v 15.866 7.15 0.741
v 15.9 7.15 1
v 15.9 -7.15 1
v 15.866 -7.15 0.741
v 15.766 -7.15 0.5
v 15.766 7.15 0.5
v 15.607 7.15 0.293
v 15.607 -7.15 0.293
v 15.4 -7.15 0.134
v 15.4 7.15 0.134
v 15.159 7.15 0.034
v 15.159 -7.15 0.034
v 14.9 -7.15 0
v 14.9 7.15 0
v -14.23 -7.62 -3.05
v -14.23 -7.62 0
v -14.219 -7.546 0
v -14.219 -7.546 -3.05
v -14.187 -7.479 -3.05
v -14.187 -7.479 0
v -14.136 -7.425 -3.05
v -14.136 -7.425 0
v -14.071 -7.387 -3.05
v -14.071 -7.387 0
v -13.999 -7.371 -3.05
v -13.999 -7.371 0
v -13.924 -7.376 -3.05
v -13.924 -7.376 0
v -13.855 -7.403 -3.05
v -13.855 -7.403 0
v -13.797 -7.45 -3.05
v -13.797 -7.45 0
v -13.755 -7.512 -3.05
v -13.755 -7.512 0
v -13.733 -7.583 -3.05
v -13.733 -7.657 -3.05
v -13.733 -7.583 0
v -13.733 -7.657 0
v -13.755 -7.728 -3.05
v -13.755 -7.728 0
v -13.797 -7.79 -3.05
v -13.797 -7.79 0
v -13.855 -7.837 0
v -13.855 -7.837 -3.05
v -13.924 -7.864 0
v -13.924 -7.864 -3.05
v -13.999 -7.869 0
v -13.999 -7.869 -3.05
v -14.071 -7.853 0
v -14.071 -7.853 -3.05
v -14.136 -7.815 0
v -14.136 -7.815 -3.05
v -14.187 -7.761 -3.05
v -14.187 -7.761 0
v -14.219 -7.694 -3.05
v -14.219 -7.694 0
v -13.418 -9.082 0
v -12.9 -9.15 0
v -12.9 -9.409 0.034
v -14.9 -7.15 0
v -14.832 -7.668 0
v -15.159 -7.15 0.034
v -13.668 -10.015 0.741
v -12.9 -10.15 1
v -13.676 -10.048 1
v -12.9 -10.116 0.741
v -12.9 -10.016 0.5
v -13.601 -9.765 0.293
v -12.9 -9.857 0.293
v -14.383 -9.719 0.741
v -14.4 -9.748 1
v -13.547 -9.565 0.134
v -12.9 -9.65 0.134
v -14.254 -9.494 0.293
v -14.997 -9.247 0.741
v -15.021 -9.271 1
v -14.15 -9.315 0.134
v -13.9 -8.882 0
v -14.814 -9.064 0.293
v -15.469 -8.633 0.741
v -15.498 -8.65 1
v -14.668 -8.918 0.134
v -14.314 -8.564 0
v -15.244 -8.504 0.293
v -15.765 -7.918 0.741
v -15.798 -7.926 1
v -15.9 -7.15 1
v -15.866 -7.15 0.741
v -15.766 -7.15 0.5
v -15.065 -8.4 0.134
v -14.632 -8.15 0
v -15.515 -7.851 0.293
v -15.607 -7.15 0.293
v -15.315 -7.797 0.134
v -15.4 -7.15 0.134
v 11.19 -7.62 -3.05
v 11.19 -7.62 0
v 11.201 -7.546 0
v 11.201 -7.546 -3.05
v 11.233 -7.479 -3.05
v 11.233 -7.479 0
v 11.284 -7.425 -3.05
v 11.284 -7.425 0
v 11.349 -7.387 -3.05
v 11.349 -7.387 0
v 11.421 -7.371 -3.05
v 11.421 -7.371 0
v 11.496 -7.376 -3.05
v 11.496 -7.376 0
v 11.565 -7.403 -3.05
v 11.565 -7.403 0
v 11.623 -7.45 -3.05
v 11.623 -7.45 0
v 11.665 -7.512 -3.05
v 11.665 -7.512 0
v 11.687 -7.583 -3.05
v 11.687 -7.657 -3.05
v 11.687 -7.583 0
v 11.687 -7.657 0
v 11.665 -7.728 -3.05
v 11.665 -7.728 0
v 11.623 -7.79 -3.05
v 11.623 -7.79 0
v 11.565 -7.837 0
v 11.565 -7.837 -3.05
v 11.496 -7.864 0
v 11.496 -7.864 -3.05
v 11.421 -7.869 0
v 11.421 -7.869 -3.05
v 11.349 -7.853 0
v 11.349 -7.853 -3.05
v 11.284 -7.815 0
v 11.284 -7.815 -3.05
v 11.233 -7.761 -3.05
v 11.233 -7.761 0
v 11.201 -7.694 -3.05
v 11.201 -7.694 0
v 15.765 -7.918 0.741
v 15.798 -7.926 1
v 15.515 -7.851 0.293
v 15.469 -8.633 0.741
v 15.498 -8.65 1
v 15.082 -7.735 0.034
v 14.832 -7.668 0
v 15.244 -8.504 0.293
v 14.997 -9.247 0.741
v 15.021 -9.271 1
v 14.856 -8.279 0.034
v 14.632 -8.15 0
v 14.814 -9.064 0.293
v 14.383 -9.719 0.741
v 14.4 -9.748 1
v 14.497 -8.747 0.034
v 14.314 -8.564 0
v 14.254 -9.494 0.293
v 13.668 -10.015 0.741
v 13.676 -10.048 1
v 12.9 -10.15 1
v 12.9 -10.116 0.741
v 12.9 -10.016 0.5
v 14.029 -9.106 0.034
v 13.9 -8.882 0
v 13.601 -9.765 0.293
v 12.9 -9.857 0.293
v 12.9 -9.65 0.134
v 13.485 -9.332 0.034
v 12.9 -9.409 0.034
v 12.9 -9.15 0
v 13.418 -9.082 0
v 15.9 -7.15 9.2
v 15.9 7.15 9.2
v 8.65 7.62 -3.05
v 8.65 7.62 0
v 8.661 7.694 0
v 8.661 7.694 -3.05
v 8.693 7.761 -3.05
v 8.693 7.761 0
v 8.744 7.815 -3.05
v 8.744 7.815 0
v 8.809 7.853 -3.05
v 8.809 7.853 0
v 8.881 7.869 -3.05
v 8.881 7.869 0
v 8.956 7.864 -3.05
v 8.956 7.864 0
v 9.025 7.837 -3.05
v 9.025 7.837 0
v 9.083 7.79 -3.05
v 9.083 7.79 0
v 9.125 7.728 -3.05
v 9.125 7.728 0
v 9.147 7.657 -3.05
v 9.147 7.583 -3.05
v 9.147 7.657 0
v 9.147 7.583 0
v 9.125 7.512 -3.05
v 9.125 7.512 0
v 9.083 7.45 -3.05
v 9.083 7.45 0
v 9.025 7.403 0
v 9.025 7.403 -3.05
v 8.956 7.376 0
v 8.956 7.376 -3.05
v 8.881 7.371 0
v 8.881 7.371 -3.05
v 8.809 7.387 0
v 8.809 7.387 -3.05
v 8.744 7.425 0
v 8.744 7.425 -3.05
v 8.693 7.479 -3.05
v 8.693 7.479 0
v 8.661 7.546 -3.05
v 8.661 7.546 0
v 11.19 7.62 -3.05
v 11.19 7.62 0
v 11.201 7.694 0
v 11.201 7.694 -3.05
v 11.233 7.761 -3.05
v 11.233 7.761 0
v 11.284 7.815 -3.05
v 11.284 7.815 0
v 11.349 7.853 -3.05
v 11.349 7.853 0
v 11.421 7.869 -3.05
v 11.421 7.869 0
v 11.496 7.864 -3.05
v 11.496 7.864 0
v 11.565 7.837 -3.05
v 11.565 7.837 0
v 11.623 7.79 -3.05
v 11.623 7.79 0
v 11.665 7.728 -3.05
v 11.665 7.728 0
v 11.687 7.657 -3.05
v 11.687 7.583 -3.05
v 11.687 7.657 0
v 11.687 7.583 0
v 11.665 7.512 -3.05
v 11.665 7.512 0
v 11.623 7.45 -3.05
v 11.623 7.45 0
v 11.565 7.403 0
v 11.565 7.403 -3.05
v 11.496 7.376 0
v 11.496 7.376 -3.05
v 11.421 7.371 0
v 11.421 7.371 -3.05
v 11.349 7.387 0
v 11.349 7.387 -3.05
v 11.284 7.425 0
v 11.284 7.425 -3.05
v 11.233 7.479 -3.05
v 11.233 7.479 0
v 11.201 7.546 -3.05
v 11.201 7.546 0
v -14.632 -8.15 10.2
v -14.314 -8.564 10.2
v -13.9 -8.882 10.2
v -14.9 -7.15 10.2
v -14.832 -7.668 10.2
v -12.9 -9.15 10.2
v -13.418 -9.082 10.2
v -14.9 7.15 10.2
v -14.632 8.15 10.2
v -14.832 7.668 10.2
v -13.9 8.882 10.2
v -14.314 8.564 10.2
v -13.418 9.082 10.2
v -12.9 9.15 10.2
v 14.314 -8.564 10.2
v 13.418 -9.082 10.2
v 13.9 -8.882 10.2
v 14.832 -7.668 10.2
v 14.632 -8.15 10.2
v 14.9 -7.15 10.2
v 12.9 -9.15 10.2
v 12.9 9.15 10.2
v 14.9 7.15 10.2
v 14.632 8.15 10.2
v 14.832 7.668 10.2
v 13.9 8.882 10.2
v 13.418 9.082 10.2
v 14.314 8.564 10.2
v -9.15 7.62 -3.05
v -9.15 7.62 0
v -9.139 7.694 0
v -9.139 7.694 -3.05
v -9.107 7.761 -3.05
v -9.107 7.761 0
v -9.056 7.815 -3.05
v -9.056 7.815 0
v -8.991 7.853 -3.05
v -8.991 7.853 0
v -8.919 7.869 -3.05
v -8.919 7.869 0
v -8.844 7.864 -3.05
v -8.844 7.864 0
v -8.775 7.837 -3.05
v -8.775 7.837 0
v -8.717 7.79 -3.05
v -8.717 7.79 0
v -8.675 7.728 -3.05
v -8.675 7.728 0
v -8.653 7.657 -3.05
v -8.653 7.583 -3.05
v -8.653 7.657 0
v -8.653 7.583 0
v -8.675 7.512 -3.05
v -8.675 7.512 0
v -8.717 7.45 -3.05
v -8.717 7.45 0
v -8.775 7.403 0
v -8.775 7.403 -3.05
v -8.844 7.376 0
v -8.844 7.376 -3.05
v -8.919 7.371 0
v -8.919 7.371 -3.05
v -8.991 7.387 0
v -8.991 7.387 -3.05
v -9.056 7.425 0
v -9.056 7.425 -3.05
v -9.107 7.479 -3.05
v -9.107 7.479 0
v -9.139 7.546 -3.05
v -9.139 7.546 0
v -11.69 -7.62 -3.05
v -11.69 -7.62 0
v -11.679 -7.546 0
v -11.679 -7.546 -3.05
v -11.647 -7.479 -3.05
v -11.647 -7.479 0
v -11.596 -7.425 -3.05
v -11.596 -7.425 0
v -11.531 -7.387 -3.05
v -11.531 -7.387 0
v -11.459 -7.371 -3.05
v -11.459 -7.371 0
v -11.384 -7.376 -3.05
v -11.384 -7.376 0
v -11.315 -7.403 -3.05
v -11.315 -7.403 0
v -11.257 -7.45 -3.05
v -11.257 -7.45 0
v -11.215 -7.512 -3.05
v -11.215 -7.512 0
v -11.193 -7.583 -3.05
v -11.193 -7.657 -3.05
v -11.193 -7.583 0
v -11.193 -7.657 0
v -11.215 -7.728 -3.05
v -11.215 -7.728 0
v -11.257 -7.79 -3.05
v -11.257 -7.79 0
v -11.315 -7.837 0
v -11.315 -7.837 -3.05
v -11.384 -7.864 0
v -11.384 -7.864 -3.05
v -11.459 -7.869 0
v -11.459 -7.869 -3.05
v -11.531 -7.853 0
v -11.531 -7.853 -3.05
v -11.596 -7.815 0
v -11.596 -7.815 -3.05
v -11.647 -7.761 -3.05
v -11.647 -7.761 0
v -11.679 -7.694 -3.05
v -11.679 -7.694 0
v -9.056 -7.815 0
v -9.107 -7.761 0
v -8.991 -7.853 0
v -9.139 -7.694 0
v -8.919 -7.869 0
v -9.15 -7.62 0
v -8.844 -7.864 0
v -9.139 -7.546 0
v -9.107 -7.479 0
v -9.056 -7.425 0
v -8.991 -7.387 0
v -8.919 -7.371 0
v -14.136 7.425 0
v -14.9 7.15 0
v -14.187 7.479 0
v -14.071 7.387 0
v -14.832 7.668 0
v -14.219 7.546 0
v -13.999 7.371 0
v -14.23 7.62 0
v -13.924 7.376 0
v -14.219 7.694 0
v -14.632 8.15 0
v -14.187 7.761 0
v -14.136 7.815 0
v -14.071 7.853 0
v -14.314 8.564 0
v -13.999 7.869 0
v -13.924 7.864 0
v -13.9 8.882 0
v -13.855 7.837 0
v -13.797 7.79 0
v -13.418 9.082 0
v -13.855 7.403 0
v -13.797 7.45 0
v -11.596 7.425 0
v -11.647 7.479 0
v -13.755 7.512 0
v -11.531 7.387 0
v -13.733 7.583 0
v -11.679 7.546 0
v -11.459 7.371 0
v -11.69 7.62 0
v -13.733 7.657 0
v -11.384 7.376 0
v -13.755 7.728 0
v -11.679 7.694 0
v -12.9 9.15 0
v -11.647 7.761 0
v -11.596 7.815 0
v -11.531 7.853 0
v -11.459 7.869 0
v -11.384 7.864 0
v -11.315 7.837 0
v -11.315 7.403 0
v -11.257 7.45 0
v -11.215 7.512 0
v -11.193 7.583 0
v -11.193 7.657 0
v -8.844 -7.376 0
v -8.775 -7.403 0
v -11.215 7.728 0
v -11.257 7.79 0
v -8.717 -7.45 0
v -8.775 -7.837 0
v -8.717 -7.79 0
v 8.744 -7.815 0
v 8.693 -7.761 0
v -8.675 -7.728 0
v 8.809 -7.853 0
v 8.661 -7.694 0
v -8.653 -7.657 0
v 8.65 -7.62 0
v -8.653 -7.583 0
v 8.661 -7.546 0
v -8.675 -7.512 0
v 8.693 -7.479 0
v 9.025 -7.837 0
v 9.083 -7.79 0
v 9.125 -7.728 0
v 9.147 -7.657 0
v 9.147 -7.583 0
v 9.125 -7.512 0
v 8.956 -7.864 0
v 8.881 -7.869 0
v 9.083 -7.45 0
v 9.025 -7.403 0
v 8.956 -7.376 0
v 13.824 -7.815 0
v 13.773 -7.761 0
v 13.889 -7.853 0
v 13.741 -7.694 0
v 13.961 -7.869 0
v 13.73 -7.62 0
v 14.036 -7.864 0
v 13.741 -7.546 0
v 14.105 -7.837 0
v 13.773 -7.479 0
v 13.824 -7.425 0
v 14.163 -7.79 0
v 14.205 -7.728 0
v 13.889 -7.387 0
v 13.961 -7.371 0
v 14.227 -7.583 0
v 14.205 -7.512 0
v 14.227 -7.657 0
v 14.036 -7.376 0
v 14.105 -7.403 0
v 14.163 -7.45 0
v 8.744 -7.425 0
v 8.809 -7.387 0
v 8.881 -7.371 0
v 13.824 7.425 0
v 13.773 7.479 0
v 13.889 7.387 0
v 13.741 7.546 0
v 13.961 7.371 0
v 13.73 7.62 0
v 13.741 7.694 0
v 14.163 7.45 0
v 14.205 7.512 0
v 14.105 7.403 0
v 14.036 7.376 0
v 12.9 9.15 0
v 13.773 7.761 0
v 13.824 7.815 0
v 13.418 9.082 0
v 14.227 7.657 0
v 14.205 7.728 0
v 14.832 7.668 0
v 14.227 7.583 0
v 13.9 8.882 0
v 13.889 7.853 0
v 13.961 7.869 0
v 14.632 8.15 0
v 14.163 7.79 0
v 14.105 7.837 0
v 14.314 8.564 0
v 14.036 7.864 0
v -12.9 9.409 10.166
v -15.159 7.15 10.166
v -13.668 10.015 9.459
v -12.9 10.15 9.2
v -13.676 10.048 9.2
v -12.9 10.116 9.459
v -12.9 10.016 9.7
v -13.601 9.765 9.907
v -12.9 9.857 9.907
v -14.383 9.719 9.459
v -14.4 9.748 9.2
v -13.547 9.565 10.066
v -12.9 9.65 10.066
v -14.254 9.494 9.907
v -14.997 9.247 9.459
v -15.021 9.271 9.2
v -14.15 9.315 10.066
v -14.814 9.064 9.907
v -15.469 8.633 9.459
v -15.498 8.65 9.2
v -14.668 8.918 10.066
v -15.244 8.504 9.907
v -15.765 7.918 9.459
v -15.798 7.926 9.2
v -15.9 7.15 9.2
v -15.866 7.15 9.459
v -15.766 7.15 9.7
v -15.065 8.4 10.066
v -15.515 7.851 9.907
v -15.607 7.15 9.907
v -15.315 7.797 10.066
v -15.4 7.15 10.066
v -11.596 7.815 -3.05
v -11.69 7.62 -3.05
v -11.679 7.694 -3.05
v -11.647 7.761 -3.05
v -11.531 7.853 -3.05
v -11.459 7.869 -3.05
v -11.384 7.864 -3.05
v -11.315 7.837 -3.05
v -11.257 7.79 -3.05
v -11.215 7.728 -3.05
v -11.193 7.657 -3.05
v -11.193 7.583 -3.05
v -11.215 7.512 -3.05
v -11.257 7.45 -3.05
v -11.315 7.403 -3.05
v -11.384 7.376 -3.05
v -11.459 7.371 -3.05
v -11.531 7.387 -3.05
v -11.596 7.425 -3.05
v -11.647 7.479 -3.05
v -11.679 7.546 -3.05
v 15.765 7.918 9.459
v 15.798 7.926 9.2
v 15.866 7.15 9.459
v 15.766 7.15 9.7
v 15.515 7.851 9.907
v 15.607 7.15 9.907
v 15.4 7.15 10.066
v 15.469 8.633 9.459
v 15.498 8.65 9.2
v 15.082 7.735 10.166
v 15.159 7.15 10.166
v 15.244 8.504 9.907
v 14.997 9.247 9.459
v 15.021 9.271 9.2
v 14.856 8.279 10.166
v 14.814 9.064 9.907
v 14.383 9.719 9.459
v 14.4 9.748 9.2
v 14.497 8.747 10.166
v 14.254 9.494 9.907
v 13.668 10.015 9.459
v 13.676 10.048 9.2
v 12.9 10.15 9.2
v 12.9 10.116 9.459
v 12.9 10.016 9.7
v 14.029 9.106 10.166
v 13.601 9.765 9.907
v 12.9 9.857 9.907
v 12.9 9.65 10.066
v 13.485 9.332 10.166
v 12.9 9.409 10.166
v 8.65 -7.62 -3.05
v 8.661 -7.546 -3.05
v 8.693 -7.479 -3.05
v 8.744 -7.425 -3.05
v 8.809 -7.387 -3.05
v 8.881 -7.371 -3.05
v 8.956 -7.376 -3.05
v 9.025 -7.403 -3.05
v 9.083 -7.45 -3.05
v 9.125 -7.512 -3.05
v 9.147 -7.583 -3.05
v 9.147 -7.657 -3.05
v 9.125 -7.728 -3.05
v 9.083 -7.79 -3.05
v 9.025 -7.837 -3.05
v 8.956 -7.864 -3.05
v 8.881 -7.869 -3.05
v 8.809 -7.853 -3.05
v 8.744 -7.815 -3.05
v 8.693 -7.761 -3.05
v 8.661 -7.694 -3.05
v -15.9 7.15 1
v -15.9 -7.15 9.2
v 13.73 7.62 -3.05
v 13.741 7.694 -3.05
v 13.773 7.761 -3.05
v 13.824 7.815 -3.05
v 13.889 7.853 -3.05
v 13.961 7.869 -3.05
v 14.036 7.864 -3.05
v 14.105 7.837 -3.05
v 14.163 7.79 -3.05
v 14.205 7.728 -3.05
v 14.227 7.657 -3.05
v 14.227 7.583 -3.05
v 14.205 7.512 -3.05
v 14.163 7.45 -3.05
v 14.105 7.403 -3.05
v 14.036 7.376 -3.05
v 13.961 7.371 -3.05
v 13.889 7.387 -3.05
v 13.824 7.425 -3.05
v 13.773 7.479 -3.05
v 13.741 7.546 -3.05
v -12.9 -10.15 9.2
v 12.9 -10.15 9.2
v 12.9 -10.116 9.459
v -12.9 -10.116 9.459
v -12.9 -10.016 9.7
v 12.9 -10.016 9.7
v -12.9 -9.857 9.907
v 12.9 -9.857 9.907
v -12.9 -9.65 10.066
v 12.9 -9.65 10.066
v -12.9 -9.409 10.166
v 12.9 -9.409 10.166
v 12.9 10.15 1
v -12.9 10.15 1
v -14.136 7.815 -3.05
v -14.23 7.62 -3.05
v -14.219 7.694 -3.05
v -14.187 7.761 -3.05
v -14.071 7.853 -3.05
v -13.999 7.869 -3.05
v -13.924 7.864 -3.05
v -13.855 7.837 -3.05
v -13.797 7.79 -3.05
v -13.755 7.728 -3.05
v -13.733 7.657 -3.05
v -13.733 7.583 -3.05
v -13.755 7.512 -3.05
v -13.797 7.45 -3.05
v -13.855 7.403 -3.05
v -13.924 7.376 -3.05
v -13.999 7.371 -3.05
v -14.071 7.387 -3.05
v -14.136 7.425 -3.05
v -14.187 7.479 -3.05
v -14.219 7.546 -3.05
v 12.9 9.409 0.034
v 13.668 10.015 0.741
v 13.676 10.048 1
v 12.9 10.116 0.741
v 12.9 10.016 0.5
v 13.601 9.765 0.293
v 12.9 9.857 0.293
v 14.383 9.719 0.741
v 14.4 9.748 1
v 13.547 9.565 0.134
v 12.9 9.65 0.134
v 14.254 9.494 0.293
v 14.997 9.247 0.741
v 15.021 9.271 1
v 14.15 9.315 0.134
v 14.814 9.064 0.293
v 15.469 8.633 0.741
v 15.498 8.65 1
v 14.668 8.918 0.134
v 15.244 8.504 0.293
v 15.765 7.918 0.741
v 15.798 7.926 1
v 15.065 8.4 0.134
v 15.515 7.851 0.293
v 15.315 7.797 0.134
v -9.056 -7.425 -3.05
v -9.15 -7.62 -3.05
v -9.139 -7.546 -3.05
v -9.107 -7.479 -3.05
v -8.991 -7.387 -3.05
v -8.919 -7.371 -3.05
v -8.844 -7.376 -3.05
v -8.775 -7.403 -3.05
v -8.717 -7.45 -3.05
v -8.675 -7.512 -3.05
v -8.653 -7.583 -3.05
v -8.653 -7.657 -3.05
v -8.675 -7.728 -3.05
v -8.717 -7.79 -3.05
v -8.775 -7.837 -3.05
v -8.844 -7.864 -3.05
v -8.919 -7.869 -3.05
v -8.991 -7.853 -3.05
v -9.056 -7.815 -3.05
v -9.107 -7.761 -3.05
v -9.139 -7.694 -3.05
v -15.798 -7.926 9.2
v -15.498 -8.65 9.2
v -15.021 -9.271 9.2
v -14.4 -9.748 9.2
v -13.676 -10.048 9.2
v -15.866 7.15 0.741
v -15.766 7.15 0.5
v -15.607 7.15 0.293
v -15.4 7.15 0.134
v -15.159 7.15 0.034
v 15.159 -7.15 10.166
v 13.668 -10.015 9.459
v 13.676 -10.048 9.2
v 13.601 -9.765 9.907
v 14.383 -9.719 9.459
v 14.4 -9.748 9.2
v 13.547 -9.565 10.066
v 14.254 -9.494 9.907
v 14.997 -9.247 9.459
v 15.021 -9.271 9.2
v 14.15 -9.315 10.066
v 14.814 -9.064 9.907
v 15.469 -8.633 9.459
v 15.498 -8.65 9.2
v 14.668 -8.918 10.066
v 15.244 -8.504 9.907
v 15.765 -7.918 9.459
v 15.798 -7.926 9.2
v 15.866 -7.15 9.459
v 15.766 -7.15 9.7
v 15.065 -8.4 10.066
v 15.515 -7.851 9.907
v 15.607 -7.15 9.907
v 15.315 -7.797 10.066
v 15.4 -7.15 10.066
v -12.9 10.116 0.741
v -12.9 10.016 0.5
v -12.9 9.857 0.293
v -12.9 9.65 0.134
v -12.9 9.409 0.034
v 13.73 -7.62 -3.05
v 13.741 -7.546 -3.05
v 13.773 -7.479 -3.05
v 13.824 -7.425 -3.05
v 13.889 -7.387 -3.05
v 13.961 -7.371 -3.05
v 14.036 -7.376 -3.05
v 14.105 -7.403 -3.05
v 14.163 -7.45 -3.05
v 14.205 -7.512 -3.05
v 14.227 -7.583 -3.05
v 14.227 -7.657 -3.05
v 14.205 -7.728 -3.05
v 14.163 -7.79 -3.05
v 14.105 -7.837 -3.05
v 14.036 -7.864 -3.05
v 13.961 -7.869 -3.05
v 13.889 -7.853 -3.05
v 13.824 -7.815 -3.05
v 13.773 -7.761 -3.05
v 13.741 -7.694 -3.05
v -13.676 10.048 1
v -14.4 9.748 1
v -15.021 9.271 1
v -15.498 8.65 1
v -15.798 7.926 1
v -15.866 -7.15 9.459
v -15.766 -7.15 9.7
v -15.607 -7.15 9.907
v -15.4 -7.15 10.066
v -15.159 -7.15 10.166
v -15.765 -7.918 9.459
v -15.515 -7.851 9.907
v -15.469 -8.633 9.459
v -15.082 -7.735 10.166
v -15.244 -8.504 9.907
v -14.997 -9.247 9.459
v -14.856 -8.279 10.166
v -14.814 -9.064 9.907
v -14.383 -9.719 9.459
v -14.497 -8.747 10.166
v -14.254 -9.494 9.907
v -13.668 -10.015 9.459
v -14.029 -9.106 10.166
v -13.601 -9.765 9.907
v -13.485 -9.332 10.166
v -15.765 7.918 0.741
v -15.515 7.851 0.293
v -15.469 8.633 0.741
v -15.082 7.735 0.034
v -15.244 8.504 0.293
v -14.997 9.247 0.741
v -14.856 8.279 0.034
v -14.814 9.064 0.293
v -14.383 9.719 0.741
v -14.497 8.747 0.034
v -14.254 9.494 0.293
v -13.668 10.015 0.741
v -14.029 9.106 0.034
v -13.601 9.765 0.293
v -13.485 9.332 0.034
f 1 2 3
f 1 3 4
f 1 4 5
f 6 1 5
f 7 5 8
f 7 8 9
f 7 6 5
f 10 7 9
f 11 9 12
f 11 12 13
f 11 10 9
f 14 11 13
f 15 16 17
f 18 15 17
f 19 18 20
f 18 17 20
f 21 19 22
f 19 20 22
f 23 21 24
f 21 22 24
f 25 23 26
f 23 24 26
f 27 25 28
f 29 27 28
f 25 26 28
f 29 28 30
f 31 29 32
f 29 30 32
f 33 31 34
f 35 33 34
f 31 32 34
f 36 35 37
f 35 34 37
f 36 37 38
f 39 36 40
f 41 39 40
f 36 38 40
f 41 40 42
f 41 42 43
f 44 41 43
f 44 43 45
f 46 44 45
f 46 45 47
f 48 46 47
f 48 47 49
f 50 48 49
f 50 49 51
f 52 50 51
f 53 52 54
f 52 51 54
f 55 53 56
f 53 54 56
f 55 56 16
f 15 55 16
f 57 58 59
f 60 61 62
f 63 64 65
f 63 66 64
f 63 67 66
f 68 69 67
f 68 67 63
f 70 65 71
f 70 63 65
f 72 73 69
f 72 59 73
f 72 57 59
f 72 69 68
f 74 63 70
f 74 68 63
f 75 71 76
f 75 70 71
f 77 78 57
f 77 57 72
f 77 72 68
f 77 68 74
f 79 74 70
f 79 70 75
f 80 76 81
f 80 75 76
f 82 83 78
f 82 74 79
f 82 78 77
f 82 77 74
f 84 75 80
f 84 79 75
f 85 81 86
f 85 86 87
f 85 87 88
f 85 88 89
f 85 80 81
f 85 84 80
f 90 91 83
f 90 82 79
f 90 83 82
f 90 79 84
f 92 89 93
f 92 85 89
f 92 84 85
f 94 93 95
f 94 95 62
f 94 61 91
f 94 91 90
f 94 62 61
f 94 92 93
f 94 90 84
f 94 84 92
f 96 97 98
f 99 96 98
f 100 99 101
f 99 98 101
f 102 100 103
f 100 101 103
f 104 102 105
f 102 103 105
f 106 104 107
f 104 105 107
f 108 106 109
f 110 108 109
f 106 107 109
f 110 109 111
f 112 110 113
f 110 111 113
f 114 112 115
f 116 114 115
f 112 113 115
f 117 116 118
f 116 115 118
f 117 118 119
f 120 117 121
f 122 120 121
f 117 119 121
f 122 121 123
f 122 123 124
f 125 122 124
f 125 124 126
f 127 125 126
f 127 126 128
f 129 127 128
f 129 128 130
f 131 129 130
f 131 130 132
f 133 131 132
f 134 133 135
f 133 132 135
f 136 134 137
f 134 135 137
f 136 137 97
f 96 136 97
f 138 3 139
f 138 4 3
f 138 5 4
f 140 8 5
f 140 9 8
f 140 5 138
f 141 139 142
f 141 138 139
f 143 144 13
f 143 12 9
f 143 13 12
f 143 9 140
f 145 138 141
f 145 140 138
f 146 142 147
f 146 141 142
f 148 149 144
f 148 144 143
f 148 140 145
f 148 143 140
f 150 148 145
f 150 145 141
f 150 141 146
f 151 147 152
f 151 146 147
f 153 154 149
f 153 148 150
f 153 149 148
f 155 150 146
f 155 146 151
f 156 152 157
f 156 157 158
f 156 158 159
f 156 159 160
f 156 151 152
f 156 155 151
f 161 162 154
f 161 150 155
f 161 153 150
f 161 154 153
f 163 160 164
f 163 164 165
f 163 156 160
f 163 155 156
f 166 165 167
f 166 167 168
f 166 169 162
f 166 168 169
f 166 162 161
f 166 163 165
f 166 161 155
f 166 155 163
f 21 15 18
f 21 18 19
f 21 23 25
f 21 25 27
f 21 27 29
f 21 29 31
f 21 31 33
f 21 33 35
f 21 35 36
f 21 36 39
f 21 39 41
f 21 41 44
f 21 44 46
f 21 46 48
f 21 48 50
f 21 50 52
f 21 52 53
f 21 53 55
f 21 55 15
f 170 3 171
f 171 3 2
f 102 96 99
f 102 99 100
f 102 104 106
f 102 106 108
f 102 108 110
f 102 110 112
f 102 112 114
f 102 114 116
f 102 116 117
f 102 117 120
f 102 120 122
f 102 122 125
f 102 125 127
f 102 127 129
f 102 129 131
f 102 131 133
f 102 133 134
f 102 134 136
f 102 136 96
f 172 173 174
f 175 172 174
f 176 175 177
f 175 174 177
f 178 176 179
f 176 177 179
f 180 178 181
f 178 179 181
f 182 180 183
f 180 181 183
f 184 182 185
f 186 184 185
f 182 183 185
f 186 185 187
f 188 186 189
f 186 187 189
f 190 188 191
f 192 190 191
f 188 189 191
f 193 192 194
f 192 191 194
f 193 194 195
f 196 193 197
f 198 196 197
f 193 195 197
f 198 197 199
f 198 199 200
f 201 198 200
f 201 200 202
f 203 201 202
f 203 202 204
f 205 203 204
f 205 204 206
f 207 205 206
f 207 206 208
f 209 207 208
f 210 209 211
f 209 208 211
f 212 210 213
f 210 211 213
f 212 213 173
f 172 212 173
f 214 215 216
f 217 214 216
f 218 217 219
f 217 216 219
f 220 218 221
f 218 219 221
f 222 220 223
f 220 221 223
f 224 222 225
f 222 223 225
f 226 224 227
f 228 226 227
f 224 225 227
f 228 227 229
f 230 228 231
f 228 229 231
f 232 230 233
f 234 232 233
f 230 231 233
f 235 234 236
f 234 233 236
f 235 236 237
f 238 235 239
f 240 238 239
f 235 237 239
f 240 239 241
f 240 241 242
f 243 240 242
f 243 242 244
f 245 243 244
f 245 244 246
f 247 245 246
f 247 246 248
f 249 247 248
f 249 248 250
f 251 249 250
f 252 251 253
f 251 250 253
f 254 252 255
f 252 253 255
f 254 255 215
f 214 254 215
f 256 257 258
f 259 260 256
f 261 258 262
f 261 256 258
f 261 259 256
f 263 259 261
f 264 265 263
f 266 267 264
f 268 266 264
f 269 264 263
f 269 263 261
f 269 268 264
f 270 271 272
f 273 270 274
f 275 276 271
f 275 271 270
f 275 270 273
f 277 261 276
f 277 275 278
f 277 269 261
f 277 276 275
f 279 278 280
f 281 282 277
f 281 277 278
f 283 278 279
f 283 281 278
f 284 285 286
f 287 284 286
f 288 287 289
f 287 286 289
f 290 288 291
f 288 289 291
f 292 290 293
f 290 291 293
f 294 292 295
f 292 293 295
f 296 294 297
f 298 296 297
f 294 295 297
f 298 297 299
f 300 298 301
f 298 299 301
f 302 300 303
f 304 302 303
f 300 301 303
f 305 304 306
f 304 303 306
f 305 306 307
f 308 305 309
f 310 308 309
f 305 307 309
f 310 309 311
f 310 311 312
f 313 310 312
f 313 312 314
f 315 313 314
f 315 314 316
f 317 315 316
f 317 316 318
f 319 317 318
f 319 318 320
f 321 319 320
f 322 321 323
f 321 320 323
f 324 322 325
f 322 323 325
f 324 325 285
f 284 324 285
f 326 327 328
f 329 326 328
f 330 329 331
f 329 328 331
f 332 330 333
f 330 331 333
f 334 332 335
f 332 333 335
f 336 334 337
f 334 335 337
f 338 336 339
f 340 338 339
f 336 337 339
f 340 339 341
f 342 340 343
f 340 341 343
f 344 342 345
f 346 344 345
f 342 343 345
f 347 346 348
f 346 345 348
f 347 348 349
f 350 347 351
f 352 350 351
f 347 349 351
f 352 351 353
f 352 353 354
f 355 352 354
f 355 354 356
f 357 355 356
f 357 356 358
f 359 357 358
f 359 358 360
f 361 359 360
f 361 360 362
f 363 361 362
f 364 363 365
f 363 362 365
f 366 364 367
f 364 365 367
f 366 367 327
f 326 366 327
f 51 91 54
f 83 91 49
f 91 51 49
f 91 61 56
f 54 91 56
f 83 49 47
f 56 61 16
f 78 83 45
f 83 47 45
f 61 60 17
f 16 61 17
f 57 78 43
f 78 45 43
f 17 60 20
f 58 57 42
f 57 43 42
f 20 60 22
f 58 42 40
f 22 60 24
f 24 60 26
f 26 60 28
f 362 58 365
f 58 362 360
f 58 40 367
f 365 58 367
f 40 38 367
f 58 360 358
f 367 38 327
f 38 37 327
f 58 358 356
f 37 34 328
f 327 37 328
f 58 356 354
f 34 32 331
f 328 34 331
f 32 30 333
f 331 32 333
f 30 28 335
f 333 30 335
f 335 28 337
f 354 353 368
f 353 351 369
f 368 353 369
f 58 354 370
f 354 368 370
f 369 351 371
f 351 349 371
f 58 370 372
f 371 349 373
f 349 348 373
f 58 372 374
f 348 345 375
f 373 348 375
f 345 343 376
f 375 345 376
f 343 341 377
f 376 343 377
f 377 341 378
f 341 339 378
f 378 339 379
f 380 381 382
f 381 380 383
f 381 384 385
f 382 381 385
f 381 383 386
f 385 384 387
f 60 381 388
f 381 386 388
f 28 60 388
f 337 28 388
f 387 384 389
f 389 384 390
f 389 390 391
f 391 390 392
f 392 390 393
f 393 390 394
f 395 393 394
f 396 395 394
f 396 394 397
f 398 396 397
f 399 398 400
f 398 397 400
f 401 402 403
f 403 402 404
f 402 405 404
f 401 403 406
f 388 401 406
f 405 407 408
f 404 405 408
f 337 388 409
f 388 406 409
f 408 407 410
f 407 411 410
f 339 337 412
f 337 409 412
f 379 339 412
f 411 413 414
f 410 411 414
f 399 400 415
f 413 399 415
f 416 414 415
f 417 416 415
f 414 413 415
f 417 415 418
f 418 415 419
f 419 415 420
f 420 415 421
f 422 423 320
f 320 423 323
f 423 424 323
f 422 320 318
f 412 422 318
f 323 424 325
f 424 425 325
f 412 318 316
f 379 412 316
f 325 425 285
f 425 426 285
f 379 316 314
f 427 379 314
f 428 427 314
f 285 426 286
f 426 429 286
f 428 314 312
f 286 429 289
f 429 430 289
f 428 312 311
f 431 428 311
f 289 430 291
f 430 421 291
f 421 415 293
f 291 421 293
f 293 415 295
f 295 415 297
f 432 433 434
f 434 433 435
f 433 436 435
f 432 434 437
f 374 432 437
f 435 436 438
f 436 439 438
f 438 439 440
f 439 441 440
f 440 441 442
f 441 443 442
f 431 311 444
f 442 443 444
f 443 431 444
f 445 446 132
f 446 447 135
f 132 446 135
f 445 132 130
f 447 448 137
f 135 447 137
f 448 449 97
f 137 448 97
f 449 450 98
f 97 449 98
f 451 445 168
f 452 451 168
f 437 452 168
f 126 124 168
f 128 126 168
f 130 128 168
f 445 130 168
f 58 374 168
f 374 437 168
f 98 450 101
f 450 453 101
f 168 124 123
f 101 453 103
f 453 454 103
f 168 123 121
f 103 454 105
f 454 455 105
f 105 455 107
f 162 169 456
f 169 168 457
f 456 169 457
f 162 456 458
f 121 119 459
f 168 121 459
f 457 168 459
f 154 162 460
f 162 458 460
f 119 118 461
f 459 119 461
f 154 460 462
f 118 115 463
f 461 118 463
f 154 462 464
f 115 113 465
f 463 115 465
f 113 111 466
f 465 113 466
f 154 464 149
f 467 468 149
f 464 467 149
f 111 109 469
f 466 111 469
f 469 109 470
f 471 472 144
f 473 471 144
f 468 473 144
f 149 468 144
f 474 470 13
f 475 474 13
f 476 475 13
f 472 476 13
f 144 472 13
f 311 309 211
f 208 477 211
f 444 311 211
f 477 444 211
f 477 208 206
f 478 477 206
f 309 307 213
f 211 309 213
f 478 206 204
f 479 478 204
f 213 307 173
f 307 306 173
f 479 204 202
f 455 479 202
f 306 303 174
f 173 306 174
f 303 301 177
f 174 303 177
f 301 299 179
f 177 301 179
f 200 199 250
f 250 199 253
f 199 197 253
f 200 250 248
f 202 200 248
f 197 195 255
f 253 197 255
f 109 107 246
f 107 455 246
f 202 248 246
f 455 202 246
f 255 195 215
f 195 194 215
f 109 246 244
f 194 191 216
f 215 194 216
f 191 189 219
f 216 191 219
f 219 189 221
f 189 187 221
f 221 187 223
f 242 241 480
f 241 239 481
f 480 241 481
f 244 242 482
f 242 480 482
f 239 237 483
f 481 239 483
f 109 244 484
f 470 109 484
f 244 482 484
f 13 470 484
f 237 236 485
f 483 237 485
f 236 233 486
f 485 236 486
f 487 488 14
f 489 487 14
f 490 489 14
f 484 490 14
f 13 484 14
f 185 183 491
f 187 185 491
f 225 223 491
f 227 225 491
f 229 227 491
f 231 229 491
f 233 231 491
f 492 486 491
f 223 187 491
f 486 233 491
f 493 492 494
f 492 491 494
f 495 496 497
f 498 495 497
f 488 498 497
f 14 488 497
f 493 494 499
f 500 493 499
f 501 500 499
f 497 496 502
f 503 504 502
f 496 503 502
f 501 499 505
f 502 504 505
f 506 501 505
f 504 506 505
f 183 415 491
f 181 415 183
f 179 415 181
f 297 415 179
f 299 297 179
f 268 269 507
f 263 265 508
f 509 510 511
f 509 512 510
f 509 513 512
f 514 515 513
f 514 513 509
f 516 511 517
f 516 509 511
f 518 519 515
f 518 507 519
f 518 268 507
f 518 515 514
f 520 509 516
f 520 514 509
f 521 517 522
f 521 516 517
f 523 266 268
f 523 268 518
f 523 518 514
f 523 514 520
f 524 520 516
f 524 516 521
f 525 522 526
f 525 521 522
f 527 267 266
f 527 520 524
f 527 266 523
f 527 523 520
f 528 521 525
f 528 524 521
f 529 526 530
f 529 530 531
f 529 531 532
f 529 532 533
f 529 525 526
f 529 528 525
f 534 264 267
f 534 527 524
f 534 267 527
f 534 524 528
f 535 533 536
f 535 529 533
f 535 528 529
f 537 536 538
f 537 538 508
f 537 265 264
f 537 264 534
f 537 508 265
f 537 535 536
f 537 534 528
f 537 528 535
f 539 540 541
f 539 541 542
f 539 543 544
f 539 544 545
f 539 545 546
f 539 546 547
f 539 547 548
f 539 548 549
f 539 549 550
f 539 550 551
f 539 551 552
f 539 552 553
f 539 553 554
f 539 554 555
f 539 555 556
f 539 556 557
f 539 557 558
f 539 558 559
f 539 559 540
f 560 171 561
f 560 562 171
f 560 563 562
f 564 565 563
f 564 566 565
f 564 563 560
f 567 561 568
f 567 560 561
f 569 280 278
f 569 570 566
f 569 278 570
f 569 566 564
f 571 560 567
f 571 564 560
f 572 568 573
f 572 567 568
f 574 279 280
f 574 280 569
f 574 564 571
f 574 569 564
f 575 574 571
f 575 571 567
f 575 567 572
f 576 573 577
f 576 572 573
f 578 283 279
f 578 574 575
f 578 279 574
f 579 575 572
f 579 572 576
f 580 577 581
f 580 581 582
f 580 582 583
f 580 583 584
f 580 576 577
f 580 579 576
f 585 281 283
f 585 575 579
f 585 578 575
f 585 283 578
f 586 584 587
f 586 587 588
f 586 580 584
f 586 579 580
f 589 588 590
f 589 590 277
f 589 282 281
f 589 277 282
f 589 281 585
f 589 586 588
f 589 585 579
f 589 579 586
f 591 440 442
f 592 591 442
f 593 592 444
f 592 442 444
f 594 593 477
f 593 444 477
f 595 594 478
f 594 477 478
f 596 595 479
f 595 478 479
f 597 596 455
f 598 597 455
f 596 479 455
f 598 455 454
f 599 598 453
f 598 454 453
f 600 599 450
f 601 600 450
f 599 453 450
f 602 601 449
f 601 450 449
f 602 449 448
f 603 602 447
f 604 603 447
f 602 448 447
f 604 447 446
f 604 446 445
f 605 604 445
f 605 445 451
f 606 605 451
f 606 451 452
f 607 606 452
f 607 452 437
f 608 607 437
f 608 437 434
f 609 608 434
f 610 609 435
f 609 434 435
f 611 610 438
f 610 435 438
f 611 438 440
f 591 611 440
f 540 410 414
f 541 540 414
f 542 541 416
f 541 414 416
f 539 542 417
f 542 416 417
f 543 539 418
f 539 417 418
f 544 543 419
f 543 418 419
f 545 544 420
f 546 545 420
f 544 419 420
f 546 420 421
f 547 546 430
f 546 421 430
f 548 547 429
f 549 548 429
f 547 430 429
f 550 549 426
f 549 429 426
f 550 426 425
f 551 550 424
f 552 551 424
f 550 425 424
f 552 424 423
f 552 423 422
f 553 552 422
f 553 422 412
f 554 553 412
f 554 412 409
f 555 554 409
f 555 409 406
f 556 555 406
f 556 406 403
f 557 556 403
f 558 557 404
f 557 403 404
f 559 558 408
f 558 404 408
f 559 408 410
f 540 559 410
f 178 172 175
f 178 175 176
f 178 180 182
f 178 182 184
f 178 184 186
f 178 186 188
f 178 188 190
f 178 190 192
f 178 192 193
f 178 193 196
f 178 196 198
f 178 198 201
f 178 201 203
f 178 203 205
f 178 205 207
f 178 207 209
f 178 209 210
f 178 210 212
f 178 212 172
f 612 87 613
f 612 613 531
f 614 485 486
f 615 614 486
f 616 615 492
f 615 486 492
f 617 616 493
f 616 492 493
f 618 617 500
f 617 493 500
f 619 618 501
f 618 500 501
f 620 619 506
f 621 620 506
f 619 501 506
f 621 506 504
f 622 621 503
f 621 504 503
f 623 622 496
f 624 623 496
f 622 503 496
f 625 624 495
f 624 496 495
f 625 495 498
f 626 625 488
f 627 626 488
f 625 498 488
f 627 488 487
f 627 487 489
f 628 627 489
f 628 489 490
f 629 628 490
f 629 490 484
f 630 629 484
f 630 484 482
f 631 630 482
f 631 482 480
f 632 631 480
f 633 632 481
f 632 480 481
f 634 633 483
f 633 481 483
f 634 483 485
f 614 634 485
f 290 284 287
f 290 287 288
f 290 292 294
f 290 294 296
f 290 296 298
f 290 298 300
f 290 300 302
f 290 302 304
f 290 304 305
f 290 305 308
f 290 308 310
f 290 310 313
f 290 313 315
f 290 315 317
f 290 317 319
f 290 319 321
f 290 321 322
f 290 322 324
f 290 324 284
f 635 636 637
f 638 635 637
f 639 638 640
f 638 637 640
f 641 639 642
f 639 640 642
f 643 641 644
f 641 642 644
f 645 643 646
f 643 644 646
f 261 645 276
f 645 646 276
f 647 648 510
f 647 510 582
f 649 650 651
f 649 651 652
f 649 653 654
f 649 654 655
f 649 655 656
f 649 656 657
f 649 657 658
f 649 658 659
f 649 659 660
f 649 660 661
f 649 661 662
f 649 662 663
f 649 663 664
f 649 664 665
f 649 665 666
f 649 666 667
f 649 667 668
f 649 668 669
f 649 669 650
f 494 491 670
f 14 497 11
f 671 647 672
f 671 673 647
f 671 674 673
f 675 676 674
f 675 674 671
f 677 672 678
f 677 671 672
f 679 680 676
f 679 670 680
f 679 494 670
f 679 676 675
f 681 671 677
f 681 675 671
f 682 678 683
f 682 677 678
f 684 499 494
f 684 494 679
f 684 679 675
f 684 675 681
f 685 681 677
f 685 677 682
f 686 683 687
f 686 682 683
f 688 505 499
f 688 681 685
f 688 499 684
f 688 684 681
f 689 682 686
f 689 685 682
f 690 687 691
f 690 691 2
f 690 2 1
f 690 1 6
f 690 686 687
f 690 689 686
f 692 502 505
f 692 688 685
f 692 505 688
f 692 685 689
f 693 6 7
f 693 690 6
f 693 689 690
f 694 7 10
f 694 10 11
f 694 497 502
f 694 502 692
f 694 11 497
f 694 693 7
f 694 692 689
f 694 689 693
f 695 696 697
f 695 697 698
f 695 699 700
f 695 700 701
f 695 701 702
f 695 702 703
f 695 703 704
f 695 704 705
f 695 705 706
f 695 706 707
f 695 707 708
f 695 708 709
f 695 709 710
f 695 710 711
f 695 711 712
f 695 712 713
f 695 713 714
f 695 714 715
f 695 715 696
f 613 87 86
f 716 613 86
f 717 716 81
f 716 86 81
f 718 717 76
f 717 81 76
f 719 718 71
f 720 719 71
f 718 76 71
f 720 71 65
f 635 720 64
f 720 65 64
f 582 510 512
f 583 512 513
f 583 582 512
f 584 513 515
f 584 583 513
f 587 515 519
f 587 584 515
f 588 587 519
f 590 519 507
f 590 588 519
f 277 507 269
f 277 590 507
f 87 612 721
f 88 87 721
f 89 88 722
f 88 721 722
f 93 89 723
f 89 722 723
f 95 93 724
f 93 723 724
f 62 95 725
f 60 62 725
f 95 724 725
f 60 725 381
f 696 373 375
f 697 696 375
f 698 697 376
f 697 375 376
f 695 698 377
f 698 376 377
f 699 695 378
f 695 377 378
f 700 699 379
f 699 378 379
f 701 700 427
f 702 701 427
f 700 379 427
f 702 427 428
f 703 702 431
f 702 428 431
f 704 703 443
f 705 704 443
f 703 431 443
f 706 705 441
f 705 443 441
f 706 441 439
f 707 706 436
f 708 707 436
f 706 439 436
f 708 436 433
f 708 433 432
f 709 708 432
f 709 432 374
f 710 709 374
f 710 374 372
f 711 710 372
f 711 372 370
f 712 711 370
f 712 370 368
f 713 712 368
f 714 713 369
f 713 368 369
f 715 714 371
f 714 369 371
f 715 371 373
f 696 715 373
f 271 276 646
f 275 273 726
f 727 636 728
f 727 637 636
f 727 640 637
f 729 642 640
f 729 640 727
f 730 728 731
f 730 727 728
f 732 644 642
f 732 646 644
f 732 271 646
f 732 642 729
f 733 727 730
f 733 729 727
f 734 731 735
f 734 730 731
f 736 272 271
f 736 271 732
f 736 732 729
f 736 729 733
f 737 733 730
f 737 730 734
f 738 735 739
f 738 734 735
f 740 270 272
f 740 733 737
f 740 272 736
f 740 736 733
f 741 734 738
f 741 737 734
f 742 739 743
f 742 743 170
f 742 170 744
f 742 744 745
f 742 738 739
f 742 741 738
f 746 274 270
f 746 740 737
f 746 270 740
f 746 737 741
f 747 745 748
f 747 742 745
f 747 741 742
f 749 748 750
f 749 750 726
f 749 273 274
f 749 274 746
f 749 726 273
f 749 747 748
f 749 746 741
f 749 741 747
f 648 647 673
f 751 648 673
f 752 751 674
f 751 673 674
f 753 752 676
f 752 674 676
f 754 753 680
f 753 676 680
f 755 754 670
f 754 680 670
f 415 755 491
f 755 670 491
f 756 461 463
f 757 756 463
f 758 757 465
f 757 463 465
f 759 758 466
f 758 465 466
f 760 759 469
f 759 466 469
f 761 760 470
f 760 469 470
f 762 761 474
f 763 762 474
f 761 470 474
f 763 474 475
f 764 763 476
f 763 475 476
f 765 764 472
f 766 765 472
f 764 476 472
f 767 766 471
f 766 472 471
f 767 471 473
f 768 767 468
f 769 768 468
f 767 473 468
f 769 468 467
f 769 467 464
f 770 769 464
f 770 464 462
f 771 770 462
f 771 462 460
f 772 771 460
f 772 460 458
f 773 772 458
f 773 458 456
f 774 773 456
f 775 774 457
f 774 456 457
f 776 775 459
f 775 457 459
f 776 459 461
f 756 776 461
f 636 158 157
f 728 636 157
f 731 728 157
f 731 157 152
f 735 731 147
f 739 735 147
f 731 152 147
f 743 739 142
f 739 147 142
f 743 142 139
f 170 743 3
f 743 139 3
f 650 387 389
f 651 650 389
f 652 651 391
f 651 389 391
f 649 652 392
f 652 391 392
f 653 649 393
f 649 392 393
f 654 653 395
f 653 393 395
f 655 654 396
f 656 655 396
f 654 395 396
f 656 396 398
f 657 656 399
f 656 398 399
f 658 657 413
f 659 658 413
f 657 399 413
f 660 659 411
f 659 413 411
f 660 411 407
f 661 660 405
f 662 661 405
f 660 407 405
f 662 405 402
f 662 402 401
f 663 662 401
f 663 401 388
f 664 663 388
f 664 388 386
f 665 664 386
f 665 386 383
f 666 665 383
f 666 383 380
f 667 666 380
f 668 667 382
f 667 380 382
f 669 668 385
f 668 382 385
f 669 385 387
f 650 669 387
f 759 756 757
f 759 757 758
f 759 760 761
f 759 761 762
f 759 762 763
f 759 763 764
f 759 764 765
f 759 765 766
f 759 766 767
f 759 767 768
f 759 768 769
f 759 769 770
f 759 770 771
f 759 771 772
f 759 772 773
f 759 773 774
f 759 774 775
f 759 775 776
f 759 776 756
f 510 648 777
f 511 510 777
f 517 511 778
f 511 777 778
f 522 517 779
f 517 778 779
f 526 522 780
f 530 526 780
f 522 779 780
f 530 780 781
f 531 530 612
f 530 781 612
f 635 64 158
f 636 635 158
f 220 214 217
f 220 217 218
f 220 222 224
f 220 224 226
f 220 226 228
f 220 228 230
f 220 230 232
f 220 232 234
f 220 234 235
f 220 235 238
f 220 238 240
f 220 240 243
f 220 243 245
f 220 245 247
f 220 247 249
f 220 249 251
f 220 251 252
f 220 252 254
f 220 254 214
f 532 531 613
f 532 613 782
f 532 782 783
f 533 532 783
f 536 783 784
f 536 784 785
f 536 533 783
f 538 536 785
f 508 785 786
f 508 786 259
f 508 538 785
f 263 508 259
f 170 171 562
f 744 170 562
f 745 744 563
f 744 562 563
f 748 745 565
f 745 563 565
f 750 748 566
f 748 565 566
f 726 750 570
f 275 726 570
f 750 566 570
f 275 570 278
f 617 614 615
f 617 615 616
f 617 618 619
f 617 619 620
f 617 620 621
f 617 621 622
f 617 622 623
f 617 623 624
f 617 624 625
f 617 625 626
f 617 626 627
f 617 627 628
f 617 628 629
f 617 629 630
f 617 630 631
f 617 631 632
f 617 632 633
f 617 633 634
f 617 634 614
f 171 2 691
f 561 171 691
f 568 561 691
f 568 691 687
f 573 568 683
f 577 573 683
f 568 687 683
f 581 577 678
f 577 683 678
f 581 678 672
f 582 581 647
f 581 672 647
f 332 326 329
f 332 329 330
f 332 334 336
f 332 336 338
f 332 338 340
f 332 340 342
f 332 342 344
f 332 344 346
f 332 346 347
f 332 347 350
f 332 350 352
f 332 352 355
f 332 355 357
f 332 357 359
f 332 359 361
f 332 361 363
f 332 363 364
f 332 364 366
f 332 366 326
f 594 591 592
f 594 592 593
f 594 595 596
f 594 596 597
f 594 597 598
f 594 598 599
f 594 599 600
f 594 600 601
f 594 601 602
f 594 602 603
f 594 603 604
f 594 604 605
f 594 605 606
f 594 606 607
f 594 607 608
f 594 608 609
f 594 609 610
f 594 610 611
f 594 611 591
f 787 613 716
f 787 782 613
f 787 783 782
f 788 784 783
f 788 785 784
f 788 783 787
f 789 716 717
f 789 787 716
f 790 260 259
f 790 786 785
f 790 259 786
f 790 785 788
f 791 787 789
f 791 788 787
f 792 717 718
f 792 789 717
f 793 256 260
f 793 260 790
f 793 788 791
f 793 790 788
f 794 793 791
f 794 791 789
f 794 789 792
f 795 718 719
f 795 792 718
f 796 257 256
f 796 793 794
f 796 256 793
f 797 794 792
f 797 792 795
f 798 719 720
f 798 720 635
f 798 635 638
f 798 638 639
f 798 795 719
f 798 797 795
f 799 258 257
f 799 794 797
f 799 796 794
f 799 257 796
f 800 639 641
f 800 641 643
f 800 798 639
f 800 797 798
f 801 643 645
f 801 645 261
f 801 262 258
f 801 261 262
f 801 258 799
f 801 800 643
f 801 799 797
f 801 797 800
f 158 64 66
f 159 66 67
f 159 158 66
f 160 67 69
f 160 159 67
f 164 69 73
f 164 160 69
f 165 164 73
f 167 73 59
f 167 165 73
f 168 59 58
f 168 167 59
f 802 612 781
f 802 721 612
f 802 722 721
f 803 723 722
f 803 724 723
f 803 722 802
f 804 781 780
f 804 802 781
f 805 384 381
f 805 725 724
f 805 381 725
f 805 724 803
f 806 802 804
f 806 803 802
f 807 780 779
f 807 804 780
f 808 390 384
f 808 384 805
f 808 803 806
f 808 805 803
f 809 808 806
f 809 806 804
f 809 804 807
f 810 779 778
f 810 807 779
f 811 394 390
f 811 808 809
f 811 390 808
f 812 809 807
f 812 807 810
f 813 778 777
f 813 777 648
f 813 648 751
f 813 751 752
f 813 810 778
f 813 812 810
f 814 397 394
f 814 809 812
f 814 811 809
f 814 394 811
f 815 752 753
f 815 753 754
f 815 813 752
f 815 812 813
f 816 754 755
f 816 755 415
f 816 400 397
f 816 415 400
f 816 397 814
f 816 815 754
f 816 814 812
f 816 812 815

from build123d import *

# Parameters (mm, degrees)
SKETCH_1_W      = 31.8
SKETCH_1_H      = 20.3
EXTRUDE_1_DEPTH = 10.2
FILLET_2_R      = 1
FILLET_1_R      = 3
SKETCH_2_R      = 0.25
EXTRUDE_2_DEPTH = 3.05


with BuildPart() as part:
    # Эскиз1 → Бобышка-Вытянуть1 (new body)
    with BuildSketch(Plane.XY):
        Rectangle(SKETCH_1_W, SKETCH_1_H)
    extrude(amount=EXTRUDE_1_DEPTH)

    # Скругление2
    fillet_2_edges = [part.edges().sort_by_distance(p)[0] for p in [
        (-15.9, 0, 10.2),
        (0, -10.15, 10.2),
        (15.9, 0, 10.2),
        (0, -10.15, 0),
        (-15.9, 0, 0),
        (0, 10.15, 0),
        (15.9, 0, 0),
        (0, 10.15, 10.2),
    ]]
    fillet(fillet_2_edges, radius=FILLET_2_R)

    # Скругление1
    # the kernel refuses this fillet: 3 mm, written as the material it takes off along each edge
    with BuildSketch(Plane(origin=(12.9, -7.15, 0), x_dir=(1, 0, 0), z_dir=(0, 1, 0))) as fillet_1_piece_1:
        with BuildLine():
            CenterArc((2, -1), 1, 0, 90)
            Line((3, -1), (3, 0))
            Line((3, 0), (2, 0))
        make_face()
    revolve(axis=Axis((12.9, -7.15, 0), (0, 0, -1)), revolution_arc=90, mode=Mode.SUBTRACT)
    with BuildSketch(Plane(origin=(-12.9, -7.15, 0), x_dir=(0, -1, 0), z_dir=(1, 0, 0))) as fillet_1_piece_2:
        with BuildLine():
            CenterArc((2, -1), 1, 0, 90)
            Line((3, -1), (3, 0))
            Line((3, 0), (2, 0))
        make_face()
    revolve(axis=Axis((-12.9, -7.15, 0), (0, 0, -1)), revolution_arc=90, mode=Mode.SUBTRACT)
    with BuildSketch(Plane(origin=(12.9, 7.15, 0), x_dir=(0, 1, 0), z_dir=(-1, 0, 0))) as fillet_1_piece_3:
        with BuildLine():
            CenterArc((2, -1), 1, 0, 90)
            Line((3, -1), (3, 0))
            Line((3, 0), (2, 0))
        make_face()
    revolve(axis=Axis((12.9, 7.15, 0), (0, 0, -1)), revolution_arc=90, mode=Mode.SUBTRACT)
    with BuildSketch(Plane(origin=(-12.9, 7.15, 0), x_dir=(-1, 0, 0), z_dir=(0, -1, 0))) as fillet_1_piece_4:
        with BuildLine():
            CenterArc((2, -1), 1, 0, 90)
            Line((3, -1), (3, 0))
            Line((3, 0), (2, 0))
        make_face()
    revolve(axis=Axis((-12.9, 7.15, 0), (0, 0, -1)), revolution_arc=90, mode=Mode.SUBTRACT)
    with BuildSketch(Plane(origin=(12.9, -7.15, 10.2), x_dir=(0, -1, 0), z_dir=(-1, 0, 0))) as fillet_1_piece_5:
        with BuildLine():
            CenterArc((2, -1), 1, 0, 90)
            Line((3, -1), (3, 0))
            Line((3, 0), (2, 0))
        make_face()
    revolve(axis=Axis((12.9, -7.15, 10.2), (0, 0, 1)), revolution_arc=90, mode=Mode.SUBTRACT)
    with BuildSketch(Plane(origin=(-12.9, -7.15, 10.2), x_dir=(-1, 0, 0), z_dir=(0, 1, 0))) as fillet_1_piece_6:
        with BuildLine():
            CenterArc((2, -1), 1, 0, 90)
            Line((3, -1), (3, 0))
            Line((3, 0), (2, 0))
        make_face()
    revolve(axis=Axis((-12.9, -7.15, 10.2), (0, 0, 1)), revolution_arc=90, mode=Mode.SUBTRACT)
    with BuildSketch(Plane(origin=(12.9, 7.15, 10.2), x_dir=(1, 0, 0), z_dir=(0, -1, 0))) as fillet_1_piece_7:
        with BuildLine():
            CenterArc((2, -1), 1, 0, 90)
            Line((3, -1), (3, 0))
            Line((3, 0), (2, 0))
        make_face()
    revolve(axis=Axis((12.9, 7.15, 10.2), (0, 0, 1)), revolution_arc=90, mode=Mode.SUBTRACT)
    with BuildSketch(Plane(origin=(-12.9, 7.15, 10.2), x_dir=(0, 1, 0), z_dir=(1, 0, 0))) as fillet_1_piece_8:
        with BuildLine():
            CenterArc((2, -1), 1, 0, 90)
            Line((3, -1), (3, 0))
            Line((3, 0), (2, 0))
        make_face()
    revolve(axis=Axis((-12.9, 7.15, 10.2), (0, 0, 1)), revolution_arc=90, mode=Mode.SUBTRACT)
    with BuildSketch(Plane(origin=(-15.9, 10.15, 0), x_dir=(0, -1, 0), z_dir=(0, 0, 1)), Plane(origin=(-15.9, -10.15, 0), x_dir=(1, 0, 0), z_dir=(0, 0, 1))) as fillet_1_piece_9:
        with BuildLine():
            CenterArc((FILLET_1_R, FILLET_1_R), FILLET_1_R, 180, 90)
            Line((0, FILLET_1_R), (0, 0))
            Line((0, 0), (FILLET_1_R, 0))
        make_face()
    extrude(amount=10.2, mode=Mode.SUBTRACT)
    with BuildSketch(Plane(origin=(15.9, 10.15, 0), x_dir=(0, -1, 0), z_dir=(0, 0, 1)), Plane(origin=(15.9, -10.15, 0), x_dir=(-1, 0, 0), z_dir=(0, 0, 1))) as fillet_1_piece_10:
        with BuildLine():
            CenterArc((FILLET_1_R, -FILLET_1_R), FILLET_1_R, 90, 90)
            Line((0, -FILLET_1_R), (0, 0))
            Line((0, 0), (FILLET_1_R, 0))
        make_face()
    extrude(amount=10.2, mode=Mode.SUBTRACT)

    # Эскиз2 → Бобышка-Вытянуть2 (add)
    with BuildSketch(Plane(origin=(0, 0, 0), x_dir=(-1, 0, 0), z_dir=(0, 0, -1))):
        with Locations((13.98, 7.62)):
            Circle(SKETCH_2_R)
        with Locations((8.9, 7.62)):
            Circle(SKETCH_2_R)
        with Locations((-11.44, 7.62)):
            Circle(SKETCH_2_R)
        with Locations((-13.98, 7.62)):
            Circle(SKETCH_2_R)
        with Locations((-13.98, -7.62)):
            Circle(SKETCH_2_R)
        with Locations((-11.44, -7.62)):
            Circle(SKETCH_2_R)
        with Locations((8.9, -7.62)):
            Circle(SKETCH_2_R)
        with Locations((13.98, -7.62)):
            Circle(SKETCH_2_R)
        with Locations((-8.9, 7.62)):
            Circle(SKETCH_2_R)
        with Locations((-8.9, -7.62)):
            Circle(SKETCH_2_R)
        with Locations((11.44, 7.62)):
            Circle(SKETCH_2_R)
        with Locations((11.44, -7.62)):
            Circle(SKETCH_2_R)
    extrude(amount=EXTRUDE_2_DEPTH)


solid = part.part
